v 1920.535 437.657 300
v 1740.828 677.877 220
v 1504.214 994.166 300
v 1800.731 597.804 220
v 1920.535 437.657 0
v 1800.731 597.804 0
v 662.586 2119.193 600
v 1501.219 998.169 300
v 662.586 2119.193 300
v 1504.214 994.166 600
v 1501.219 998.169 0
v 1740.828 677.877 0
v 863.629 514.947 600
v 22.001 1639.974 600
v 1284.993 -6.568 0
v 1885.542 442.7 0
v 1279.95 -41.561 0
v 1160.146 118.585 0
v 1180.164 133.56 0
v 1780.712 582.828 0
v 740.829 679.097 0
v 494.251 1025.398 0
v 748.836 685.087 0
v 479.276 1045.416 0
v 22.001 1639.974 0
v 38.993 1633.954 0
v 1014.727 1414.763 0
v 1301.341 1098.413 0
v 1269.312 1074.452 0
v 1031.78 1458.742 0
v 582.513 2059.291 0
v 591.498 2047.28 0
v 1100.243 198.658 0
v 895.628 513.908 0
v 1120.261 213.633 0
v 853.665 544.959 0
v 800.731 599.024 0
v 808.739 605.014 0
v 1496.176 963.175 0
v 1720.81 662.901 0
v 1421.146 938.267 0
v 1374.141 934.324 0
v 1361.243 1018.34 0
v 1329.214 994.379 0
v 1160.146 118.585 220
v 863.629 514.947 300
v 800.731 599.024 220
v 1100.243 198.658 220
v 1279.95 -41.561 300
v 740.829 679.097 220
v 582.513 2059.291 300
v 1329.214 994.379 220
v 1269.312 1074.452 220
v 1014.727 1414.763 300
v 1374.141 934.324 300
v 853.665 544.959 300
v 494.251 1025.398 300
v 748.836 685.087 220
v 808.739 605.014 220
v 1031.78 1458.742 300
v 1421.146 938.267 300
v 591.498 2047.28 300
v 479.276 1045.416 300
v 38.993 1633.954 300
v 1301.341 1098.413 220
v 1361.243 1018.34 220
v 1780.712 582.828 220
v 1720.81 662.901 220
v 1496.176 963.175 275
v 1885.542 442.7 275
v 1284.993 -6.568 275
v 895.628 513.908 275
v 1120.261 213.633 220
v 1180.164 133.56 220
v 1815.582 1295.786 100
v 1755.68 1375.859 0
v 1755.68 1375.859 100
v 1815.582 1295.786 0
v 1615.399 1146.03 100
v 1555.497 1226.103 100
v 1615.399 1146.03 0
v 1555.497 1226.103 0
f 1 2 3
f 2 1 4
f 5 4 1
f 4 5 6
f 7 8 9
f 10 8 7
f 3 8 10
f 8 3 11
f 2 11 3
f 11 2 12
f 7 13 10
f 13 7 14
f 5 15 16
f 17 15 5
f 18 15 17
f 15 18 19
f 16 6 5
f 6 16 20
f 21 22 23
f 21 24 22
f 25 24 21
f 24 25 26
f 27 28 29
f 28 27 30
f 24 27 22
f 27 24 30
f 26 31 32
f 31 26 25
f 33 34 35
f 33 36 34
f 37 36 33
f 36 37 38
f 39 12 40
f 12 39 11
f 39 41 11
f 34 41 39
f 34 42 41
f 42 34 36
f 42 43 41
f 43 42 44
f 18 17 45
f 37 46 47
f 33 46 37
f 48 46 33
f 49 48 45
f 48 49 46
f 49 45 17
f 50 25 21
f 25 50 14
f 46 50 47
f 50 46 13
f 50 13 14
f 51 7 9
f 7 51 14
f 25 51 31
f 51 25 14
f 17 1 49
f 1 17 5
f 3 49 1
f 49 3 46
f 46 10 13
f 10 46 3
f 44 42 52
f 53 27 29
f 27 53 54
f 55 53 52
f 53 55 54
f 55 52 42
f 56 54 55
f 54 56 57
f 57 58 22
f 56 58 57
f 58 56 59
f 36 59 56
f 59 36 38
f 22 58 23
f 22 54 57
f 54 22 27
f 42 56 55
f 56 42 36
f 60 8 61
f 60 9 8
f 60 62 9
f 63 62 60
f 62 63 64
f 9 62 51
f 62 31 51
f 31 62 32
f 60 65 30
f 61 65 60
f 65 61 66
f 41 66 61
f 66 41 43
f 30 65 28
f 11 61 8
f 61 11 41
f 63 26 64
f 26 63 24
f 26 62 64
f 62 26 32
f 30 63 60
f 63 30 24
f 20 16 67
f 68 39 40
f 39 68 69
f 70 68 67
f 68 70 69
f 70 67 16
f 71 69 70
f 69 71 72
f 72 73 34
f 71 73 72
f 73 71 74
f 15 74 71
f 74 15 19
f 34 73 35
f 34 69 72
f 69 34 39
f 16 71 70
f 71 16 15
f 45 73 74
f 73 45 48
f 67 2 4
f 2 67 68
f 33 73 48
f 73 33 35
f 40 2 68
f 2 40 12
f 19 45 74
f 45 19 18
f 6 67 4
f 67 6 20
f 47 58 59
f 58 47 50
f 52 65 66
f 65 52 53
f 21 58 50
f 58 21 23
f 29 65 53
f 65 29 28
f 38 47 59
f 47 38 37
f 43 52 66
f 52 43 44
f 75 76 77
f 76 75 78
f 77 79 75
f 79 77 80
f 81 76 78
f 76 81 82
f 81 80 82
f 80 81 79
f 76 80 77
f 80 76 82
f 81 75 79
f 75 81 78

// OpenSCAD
a = 500 * [[0,0],[0,5.2],[1.5,5.4],[6.5,-1.2]];

%polygon(a);

module mainbuilding() {
    difference() {
    color("gray") cube([800,2100,600], center=false);
        
        // terrece
      color("gray") translate([-5,-5,300]) cube([850,700,350], center=false); 

       // main unit cutout
        color("gray") translate([10,725,0]) cube([650,600,300], center=false); 


        // front cut off
       color("gray") translate([700,700,0]) cube([150,1400,300], center=false); 

       // garage
        color("gray") translate([10,1350,0]) cube([750,735,300], center=false); 

       // rental unit cutout
        color("gray") translate([25,25,-25]) cube([750,650,300], center=false); 

       // rental unit door
        color("gray") translate([-10,200,0]) cube([850,100,220], center=false); 

       // main door
        color("gray") translate([-10,800,0]) cube([850,100,220], center=false); 

    }
}

module rentalunit() {
    difference() {
       color("darkgray") cube([800,700,300], center=false); 
      
        translate([25,25,0]) cube([750,650,250], center=false);
        
        translate([-100,400,20]) cube([1400,200,200], center=false);

        translate([-100,100,120]) cube([1400,200,100], center=false);
    }
}

module garage() {
    // 680 x 735 garasje.
    difference() {
     color("lightgray") cube([680,735,300], center=false);   

            translate([25,25,0]) cube([730,685,250], center=false);
    }

}

rotate([0,0,36.8]) union() { 
    translate([1000,-800,0]) mainbuilding();
    
    translate([1980,-50,0]) cube([250,100,100]);
}
    
